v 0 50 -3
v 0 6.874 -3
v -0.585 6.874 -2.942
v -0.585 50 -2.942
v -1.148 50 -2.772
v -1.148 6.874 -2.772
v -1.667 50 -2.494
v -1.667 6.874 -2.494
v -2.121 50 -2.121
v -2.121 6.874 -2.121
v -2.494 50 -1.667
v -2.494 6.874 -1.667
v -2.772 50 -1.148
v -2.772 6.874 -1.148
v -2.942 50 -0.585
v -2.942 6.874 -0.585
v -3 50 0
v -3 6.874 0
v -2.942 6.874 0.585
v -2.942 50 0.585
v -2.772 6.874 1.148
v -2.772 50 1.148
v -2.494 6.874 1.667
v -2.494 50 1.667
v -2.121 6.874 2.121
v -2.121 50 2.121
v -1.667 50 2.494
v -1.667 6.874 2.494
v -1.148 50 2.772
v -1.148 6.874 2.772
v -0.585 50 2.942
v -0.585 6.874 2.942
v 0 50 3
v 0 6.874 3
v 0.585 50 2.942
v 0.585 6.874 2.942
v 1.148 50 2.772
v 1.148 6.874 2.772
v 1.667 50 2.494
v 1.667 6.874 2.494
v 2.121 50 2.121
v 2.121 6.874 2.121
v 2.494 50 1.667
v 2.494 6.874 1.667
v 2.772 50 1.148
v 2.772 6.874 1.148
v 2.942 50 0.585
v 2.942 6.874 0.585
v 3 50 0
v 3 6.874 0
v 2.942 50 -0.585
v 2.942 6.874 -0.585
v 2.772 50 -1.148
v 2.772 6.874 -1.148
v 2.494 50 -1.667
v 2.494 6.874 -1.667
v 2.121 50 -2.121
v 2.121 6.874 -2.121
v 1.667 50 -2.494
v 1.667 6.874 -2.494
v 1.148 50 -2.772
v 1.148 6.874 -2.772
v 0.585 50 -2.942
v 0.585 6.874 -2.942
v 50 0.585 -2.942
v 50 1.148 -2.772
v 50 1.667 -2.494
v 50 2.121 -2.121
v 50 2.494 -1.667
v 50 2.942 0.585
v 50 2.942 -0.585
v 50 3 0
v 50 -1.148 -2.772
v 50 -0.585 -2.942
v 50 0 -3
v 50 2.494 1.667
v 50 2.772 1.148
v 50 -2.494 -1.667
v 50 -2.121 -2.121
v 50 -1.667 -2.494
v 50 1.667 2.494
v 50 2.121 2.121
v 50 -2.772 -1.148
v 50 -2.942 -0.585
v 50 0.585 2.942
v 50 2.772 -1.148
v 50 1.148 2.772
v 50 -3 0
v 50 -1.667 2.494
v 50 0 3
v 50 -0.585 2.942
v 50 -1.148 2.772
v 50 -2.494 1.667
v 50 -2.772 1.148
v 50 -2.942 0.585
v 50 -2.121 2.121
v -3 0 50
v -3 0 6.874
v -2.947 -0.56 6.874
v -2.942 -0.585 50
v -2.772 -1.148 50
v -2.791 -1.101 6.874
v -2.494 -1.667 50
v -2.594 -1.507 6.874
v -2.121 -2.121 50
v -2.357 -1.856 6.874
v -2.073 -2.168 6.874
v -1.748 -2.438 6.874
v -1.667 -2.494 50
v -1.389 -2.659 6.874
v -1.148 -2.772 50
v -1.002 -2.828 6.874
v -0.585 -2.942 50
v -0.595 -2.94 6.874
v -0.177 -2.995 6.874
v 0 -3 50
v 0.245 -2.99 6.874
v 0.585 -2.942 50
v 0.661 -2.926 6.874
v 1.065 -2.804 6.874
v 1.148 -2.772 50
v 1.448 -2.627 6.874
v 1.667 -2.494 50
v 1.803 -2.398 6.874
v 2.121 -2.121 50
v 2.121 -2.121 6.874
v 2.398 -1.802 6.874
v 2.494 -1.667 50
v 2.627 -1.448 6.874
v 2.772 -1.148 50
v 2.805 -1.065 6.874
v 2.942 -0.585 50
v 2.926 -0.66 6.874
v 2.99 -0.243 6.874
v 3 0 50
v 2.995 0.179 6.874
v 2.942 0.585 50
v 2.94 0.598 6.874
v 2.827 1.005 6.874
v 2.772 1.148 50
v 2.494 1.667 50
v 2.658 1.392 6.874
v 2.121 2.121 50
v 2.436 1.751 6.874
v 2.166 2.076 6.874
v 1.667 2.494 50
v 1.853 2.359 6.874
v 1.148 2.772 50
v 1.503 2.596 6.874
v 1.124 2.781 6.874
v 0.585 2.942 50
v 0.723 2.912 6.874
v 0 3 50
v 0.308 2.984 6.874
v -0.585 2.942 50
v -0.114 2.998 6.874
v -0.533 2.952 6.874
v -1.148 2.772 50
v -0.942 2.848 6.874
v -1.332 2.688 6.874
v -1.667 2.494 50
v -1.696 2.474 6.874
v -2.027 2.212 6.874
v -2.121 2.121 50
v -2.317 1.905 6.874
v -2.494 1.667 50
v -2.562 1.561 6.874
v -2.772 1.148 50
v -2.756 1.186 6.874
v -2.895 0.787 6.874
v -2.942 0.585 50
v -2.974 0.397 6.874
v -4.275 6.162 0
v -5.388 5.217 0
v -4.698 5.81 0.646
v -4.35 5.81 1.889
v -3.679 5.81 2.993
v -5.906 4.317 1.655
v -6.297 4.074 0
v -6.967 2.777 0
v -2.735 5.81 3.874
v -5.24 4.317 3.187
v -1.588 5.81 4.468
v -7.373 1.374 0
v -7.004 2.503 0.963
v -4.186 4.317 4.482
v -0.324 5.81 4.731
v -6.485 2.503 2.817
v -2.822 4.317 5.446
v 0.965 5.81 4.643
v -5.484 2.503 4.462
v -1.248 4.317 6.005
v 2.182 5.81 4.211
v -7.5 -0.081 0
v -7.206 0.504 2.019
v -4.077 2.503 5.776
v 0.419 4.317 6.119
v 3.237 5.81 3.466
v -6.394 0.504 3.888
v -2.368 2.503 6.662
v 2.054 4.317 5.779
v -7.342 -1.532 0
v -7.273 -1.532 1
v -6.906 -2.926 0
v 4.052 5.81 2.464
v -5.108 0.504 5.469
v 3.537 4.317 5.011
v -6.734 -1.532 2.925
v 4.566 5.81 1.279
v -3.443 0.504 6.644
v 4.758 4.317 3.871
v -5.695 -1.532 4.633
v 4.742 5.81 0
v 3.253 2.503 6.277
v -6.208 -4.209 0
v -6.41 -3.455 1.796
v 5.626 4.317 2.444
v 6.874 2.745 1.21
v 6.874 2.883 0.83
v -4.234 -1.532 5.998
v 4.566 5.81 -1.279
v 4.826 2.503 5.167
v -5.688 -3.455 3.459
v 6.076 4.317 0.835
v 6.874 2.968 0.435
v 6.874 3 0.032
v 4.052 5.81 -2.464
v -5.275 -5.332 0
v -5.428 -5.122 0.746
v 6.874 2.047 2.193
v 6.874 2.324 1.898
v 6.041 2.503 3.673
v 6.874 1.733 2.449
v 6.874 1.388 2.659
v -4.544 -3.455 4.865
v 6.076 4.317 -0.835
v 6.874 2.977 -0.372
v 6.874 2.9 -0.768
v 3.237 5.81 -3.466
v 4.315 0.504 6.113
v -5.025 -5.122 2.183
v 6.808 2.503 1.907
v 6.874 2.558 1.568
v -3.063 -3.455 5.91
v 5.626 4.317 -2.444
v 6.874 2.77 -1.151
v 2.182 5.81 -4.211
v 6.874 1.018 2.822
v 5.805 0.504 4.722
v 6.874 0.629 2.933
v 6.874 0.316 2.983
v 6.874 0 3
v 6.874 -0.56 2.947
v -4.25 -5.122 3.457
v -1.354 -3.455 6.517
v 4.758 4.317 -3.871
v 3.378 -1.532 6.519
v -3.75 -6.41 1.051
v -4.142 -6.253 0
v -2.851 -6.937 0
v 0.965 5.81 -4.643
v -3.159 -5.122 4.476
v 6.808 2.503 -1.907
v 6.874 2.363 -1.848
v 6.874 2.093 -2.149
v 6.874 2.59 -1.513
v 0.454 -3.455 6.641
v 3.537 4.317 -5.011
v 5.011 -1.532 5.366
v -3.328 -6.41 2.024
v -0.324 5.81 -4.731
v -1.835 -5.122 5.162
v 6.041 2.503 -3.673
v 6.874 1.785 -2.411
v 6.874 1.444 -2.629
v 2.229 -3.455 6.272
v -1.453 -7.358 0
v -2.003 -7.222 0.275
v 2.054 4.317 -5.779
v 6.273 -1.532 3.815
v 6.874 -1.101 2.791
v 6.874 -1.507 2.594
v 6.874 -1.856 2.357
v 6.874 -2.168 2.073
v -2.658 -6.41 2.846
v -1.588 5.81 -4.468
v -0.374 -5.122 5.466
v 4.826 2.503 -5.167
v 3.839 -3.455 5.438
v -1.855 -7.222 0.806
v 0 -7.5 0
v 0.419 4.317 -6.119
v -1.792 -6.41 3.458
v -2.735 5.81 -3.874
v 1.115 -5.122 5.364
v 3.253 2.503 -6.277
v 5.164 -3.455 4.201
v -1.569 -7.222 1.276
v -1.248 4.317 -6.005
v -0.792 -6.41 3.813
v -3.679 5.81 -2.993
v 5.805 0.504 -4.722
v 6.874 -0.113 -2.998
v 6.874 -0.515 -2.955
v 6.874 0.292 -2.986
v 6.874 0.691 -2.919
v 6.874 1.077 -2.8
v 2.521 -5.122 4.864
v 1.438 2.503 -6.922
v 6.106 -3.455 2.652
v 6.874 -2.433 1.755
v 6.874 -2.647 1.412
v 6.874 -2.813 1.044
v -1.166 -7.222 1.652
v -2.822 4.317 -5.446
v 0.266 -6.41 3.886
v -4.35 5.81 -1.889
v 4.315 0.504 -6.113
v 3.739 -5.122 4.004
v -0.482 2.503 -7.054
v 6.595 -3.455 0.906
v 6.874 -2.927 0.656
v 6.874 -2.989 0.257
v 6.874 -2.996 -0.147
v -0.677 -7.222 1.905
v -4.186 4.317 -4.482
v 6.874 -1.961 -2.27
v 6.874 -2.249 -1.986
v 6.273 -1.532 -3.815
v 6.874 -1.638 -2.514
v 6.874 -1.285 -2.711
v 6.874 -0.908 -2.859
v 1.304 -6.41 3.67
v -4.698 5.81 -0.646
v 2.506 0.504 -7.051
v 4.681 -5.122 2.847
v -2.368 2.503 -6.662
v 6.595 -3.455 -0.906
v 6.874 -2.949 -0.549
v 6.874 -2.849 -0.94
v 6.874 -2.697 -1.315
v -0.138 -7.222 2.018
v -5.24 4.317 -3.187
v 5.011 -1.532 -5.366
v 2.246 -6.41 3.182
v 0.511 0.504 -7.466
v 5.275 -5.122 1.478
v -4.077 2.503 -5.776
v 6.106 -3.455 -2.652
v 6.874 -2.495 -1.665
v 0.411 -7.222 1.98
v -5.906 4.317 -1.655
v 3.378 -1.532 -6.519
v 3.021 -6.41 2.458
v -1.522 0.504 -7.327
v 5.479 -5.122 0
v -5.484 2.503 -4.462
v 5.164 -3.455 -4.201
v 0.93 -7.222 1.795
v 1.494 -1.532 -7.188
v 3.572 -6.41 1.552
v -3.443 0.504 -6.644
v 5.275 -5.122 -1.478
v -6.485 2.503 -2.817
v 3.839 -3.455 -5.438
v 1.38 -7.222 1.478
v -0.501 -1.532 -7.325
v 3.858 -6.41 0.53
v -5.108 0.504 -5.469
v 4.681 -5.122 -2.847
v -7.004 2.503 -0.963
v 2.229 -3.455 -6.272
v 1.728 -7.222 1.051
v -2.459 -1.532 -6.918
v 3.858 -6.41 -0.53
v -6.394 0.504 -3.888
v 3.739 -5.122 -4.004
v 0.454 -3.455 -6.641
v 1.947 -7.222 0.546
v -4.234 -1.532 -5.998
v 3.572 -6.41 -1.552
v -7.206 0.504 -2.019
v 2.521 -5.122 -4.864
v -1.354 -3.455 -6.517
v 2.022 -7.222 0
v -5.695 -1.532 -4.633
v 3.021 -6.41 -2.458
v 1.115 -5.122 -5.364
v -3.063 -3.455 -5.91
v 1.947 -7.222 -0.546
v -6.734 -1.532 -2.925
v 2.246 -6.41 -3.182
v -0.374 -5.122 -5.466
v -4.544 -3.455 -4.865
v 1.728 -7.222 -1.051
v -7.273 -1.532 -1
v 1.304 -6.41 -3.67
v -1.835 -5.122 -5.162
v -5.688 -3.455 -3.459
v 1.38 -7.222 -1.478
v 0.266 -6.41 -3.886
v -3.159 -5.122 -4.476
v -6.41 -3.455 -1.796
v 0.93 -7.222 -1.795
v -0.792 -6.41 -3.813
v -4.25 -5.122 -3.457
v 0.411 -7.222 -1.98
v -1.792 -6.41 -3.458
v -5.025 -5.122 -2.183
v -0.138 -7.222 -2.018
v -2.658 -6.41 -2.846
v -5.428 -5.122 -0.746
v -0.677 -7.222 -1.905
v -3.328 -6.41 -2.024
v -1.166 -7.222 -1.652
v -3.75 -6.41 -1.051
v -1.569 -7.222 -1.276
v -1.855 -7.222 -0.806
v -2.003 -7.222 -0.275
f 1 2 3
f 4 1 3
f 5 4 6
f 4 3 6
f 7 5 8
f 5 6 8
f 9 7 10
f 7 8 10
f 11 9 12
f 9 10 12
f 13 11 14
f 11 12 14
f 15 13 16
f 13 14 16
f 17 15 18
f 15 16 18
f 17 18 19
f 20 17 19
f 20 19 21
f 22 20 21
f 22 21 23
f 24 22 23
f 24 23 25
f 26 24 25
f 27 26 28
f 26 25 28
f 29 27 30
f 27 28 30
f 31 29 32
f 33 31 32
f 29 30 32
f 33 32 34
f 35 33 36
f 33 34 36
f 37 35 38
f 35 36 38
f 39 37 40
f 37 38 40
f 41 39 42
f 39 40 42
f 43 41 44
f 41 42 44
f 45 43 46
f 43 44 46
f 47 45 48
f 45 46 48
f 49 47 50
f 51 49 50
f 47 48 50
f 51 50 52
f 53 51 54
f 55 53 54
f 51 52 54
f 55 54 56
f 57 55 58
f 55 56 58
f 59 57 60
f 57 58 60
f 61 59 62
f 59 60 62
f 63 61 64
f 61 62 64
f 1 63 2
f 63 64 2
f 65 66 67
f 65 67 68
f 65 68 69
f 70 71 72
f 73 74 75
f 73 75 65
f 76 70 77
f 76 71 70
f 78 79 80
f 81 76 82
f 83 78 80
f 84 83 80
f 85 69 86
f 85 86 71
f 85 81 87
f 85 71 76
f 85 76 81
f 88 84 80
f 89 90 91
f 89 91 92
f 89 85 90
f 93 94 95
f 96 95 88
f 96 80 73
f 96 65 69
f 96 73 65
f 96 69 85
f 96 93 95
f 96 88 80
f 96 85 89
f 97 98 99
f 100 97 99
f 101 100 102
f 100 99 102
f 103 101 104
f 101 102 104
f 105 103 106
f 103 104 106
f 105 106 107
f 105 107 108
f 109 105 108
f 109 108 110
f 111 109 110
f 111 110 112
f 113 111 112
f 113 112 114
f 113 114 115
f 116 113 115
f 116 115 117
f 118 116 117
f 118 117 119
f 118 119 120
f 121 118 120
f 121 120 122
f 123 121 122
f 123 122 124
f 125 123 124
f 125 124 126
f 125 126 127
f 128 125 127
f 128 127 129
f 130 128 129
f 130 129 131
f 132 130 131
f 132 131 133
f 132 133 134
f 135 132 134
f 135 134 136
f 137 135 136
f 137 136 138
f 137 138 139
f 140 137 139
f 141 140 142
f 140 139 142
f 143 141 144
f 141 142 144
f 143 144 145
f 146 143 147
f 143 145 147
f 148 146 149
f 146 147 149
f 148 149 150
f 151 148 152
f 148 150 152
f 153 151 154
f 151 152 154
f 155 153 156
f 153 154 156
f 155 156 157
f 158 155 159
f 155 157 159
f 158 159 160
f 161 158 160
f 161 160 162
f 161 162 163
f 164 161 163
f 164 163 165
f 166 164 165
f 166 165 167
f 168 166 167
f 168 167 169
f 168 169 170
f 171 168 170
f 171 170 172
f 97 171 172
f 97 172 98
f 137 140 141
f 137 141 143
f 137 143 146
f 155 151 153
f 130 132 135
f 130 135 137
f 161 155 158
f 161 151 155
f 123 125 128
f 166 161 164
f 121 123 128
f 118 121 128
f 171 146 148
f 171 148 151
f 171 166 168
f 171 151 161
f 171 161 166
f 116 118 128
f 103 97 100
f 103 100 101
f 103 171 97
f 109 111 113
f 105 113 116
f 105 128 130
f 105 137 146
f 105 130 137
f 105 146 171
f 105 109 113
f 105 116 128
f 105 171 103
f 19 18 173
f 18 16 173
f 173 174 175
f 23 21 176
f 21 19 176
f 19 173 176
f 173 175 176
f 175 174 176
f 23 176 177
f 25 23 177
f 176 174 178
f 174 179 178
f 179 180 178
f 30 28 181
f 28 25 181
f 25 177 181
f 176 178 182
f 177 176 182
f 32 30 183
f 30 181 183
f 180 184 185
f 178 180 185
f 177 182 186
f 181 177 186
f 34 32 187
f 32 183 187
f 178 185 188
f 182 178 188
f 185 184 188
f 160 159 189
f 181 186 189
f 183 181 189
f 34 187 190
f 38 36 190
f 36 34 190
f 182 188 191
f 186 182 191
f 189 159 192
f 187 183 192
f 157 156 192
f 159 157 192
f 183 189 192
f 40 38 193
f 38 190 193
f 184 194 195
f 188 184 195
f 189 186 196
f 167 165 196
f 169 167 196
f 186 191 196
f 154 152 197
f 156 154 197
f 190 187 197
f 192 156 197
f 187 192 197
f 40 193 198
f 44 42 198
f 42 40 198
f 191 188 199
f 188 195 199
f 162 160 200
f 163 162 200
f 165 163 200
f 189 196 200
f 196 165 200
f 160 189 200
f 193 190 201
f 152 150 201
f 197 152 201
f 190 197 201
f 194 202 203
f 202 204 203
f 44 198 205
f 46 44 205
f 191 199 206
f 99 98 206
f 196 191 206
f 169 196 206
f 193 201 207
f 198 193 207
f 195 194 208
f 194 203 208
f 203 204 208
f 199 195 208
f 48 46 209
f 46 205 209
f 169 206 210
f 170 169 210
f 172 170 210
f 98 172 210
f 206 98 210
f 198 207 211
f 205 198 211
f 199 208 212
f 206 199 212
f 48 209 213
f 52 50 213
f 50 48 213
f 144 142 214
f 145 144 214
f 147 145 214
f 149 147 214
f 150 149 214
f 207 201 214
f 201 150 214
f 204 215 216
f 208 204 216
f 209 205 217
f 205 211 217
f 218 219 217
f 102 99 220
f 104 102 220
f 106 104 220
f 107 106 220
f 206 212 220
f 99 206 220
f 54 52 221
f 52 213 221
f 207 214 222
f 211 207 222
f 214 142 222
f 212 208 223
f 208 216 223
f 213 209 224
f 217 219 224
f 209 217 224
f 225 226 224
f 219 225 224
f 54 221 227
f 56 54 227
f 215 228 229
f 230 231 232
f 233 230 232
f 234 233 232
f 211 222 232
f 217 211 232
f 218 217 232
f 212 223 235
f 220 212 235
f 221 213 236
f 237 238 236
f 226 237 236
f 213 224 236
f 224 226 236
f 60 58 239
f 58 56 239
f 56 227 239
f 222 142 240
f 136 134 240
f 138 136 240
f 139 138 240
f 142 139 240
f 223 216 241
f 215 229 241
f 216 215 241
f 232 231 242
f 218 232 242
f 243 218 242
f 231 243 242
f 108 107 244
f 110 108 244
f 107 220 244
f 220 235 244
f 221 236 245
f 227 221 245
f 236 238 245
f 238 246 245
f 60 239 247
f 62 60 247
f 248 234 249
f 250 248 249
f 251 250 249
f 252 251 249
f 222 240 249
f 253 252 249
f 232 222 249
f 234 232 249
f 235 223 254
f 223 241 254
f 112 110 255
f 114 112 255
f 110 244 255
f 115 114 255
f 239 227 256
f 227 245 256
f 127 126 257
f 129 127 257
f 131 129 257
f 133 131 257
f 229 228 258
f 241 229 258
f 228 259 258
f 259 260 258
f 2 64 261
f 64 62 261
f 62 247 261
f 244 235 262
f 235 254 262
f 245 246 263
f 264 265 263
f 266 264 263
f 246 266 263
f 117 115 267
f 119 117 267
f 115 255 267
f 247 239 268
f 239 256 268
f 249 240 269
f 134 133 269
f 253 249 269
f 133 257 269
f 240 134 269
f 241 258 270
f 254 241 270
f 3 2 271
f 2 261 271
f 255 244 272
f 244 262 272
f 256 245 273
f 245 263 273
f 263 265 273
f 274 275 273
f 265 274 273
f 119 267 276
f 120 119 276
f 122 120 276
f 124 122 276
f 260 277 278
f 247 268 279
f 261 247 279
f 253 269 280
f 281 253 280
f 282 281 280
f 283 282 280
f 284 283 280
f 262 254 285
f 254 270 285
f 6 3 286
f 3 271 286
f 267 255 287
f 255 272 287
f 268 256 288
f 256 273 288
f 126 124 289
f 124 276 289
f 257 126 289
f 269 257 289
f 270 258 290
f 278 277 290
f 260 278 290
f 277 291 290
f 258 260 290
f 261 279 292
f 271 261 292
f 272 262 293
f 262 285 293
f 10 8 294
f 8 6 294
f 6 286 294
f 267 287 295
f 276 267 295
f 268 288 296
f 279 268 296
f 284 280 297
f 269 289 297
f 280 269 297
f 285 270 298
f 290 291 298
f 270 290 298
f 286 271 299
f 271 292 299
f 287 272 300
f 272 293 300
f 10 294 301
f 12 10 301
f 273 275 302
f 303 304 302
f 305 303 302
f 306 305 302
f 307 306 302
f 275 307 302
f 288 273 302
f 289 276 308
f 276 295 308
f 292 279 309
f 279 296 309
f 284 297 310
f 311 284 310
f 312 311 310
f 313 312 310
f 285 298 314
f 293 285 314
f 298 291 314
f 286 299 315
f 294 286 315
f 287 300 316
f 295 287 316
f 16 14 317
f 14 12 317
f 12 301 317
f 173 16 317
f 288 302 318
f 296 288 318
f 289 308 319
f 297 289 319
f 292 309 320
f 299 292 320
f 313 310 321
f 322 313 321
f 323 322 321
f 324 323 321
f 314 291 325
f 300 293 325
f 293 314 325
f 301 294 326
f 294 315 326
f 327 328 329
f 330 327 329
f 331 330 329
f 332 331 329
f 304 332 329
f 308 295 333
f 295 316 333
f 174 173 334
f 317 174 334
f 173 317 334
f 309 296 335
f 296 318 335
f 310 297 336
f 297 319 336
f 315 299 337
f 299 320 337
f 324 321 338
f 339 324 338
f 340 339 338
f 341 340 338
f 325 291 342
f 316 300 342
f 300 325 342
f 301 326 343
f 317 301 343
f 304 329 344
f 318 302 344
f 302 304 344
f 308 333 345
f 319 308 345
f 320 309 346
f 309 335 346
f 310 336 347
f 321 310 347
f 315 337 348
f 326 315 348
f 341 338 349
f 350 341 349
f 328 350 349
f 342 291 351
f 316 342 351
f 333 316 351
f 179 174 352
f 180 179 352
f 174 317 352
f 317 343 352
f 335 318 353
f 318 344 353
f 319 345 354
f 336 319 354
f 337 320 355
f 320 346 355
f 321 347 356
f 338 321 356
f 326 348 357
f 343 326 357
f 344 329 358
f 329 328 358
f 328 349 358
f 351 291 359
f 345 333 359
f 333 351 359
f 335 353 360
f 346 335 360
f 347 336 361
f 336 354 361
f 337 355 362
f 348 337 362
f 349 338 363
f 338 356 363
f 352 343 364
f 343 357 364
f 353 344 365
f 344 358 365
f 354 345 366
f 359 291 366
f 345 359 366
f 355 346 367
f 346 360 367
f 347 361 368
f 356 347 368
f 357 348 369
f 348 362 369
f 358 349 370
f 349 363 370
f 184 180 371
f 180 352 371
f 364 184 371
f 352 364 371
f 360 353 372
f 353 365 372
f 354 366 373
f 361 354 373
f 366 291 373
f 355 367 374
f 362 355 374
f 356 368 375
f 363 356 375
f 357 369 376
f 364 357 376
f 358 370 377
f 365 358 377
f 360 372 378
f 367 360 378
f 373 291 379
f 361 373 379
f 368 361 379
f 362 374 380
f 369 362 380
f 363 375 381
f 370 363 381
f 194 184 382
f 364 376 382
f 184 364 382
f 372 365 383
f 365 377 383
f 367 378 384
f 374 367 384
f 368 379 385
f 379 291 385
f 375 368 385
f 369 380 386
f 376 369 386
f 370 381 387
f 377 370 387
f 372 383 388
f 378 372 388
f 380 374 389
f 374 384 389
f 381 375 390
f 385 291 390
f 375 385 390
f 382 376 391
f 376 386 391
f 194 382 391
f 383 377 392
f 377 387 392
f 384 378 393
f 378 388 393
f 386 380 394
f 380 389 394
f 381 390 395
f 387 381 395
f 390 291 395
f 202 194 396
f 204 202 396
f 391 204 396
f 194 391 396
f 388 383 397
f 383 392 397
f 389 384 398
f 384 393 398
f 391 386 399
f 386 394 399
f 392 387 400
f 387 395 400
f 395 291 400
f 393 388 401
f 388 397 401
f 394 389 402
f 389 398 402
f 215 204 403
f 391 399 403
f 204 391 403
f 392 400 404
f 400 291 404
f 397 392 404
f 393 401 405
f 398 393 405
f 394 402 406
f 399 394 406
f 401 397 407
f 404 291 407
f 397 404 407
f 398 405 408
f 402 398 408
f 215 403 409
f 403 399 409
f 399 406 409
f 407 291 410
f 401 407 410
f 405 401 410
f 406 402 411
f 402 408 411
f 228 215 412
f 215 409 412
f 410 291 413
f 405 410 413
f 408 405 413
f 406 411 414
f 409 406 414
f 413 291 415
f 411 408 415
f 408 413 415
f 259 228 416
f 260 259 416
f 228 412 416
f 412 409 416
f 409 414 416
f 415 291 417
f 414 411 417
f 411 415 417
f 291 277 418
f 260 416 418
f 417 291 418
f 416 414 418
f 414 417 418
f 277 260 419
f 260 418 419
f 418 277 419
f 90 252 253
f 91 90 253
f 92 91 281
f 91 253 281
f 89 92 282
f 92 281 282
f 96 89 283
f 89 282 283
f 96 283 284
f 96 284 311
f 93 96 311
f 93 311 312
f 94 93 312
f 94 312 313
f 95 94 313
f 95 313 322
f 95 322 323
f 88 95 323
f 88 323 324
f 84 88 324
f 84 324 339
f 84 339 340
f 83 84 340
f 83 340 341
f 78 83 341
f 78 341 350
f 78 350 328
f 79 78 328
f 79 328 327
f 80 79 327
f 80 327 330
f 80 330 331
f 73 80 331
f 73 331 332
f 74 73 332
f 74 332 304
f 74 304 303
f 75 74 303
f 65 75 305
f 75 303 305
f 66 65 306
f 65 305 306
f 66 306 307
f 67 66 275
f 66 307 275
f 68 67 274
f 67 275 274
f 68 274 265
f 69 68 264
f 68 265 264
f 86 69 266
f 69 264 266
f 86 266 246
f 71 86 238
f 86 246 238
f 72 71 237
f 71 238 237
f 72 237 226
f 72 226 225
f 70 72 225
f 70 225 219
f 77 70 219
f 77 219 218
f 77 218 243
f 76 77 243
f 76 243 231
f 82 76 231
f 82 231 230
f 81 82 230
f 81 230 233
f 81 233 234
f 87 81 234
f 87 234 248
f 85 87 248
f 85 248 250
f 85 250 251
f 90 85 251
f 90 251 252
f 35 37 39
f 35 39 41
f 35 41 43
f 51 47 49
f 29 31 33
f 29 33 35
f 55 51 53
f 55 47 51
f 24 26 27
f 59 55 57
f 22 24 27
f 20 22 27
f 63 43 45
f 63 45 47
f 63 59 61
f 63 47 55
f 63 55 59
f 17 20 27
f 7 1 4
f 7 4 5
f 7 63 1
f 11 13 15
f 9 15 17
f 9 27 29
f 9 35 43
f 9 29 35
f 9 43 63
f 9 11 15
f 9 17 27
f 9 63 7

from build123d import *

# Parameters (mm, degrees)
SKETCH_5_R      = 3
EXTRUDE_1_DEPTH = 50
SKETCH_6_R      = 3
EXTRUDE_2_DEPTH = 50
SKETCH_7_R      = 3
EXTRUDE_3_DEPTH = 50


with BuildPart() as part:
    # 草图4 → 旋转10 (revolve)
    with BuildSketch(Plane.XY):
        with BuildLine():
            Line((0, -7.5), (0, 7.5))
            ThreePointArc((0, 7.5), (-7.5, 0), (0, -7.5))
        make_face()
    revolve(axis=Axis((0, -7.5, 0), (0, 1, 0)))

    # 草图5 → 凸台-拉伸1 (add)
    with BuildSketch(Plane(origin=(0, 0, 0), x_dir=(1, 0, 0), z_dir=(0, 1, 0))):
        with Locations(Location((0, 0, 0), (0, 0, 90))):
            Circle(SKETCH_5_R)
    extrude(amount=EXTRUDE_1_DEPTH)

    # 草图6 → 凸台-拉伸2 (add)
    with BuildSketch(Plane.XY):
        with Locations(Location((0, 0, 0), (0, 0, 180))):
            Circle(SKETCH_6_R)
    extrude(amount=EXTRUDE_2_DEPTH)

    # 草图7 → 凸台-拉伸3 (add)
    with BuildSketch(Plane(origin=(0, 0, 0), x_dir=(0, 0, -1), z_dir=(1, 0, 0))):
        with Locations(Location((0, 0, 0), (0, 0, 180))):
            Circle(SKETCH_7_R)
    extrude(amount=EXTRUDE_3_DEPTH)


solid = part.part
